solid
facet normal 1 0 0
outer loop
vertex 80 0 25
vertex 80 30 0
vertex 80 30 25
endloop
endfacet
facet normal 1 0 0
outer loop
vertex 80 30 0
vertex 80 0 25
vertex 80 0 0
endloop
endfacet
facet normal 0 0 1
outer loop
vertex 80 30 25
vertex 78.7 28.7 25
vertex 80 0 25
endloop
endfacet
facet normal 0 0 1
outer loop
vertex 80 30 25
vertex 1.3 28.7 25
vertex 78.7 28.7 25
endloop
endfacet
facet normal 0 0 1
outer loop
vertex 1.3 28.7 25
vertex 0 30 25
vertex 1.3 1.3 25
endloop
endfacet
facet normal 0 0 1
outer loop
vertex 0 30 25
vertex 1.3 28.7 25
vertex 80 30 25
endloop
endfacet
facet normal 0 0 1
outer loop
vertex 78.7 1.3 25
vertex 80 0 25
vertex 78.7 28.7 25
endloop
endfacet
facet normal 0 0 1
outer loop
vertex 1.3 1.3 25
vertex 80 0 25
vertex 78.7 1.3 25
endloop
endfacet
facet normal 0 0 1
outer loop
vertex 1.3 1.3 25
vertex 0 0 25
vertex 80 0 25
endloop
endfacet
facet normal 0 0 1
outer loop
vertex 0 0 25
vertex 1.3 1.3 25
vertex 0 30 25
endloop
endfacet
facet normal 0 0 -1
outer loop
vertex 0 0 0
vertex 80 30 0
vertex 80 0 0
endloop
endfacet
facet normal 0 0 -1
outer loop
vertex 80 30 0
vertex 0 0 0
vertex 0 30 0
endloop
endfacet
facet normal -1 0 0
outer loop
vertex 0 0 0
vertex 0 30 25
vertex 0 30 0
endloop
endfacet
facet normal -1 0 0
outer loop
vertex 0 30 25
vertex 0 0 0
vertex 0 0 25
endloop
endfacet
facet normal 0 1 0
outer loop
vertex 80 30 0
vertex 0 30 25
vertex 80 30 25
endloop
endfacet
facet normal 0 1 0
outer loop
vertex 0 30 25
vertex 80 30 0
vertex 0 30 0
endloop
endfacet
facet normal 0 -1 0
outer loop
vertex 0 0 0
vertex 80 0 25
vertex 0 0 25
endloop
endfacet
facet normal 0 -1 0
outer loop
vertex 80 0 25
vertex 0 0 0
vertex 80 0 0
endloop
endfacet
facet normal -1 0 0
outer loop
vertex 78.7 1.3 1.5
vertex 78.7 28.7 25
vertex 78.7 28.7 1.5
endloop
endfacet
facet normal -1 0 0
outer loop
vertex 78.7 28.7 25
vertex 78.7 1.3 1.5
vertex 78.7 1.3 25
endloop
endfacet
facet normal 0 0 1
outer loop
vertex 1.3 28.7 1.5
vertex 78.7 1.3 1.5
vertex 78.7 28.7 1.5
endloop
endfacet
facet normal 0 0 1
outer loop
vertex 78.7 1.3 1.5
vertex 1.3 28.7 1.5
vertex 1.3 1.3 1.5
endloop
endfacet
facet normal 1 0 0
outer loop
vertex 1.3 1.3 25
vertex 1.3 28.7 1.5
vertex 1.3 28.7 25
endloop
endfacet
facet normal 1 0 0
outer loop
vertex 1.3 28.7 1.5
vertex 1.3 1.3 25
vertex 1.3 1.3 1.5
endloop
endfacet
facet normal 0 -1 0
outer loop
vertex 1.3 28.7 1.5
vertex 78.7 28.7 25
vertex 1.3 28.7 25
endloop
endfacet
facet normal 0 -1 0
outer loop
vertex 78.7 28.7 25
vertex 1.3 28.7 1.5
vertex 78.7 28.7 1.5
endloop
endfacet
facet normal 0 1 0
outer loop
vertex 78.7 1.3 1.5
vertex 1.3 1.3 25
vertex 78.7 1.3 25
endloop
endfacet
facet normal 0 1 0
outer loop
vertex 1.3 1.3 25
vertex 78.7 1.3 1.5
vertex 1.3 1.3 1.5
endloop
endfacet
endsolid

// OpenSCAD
$fn = 32;

// ----------------------------------------------------------------------
// Open box: 1.3 mm walls
// ----------------------------------------------------------------------

// --- parameters (mm) ---
box_l = 80;               // outer length, X
box_w = 30;               // outer width, Y
box_h = 25;               // outer height, Z
wall = 1.3;               // wall thickness
floor = 1.5;              // floor thickness
fit_tol = 0.02;           // tolerance for press fits, mm
free_tol = 0.2;           // tolerance for clearance fits, mm

difference() {
  cube([box_l, box_w, box_h]);
  translate([wall, wall, floor])
    cube([box_l - 2 * wall, box_w - 2 * wall, box_h]);
}
